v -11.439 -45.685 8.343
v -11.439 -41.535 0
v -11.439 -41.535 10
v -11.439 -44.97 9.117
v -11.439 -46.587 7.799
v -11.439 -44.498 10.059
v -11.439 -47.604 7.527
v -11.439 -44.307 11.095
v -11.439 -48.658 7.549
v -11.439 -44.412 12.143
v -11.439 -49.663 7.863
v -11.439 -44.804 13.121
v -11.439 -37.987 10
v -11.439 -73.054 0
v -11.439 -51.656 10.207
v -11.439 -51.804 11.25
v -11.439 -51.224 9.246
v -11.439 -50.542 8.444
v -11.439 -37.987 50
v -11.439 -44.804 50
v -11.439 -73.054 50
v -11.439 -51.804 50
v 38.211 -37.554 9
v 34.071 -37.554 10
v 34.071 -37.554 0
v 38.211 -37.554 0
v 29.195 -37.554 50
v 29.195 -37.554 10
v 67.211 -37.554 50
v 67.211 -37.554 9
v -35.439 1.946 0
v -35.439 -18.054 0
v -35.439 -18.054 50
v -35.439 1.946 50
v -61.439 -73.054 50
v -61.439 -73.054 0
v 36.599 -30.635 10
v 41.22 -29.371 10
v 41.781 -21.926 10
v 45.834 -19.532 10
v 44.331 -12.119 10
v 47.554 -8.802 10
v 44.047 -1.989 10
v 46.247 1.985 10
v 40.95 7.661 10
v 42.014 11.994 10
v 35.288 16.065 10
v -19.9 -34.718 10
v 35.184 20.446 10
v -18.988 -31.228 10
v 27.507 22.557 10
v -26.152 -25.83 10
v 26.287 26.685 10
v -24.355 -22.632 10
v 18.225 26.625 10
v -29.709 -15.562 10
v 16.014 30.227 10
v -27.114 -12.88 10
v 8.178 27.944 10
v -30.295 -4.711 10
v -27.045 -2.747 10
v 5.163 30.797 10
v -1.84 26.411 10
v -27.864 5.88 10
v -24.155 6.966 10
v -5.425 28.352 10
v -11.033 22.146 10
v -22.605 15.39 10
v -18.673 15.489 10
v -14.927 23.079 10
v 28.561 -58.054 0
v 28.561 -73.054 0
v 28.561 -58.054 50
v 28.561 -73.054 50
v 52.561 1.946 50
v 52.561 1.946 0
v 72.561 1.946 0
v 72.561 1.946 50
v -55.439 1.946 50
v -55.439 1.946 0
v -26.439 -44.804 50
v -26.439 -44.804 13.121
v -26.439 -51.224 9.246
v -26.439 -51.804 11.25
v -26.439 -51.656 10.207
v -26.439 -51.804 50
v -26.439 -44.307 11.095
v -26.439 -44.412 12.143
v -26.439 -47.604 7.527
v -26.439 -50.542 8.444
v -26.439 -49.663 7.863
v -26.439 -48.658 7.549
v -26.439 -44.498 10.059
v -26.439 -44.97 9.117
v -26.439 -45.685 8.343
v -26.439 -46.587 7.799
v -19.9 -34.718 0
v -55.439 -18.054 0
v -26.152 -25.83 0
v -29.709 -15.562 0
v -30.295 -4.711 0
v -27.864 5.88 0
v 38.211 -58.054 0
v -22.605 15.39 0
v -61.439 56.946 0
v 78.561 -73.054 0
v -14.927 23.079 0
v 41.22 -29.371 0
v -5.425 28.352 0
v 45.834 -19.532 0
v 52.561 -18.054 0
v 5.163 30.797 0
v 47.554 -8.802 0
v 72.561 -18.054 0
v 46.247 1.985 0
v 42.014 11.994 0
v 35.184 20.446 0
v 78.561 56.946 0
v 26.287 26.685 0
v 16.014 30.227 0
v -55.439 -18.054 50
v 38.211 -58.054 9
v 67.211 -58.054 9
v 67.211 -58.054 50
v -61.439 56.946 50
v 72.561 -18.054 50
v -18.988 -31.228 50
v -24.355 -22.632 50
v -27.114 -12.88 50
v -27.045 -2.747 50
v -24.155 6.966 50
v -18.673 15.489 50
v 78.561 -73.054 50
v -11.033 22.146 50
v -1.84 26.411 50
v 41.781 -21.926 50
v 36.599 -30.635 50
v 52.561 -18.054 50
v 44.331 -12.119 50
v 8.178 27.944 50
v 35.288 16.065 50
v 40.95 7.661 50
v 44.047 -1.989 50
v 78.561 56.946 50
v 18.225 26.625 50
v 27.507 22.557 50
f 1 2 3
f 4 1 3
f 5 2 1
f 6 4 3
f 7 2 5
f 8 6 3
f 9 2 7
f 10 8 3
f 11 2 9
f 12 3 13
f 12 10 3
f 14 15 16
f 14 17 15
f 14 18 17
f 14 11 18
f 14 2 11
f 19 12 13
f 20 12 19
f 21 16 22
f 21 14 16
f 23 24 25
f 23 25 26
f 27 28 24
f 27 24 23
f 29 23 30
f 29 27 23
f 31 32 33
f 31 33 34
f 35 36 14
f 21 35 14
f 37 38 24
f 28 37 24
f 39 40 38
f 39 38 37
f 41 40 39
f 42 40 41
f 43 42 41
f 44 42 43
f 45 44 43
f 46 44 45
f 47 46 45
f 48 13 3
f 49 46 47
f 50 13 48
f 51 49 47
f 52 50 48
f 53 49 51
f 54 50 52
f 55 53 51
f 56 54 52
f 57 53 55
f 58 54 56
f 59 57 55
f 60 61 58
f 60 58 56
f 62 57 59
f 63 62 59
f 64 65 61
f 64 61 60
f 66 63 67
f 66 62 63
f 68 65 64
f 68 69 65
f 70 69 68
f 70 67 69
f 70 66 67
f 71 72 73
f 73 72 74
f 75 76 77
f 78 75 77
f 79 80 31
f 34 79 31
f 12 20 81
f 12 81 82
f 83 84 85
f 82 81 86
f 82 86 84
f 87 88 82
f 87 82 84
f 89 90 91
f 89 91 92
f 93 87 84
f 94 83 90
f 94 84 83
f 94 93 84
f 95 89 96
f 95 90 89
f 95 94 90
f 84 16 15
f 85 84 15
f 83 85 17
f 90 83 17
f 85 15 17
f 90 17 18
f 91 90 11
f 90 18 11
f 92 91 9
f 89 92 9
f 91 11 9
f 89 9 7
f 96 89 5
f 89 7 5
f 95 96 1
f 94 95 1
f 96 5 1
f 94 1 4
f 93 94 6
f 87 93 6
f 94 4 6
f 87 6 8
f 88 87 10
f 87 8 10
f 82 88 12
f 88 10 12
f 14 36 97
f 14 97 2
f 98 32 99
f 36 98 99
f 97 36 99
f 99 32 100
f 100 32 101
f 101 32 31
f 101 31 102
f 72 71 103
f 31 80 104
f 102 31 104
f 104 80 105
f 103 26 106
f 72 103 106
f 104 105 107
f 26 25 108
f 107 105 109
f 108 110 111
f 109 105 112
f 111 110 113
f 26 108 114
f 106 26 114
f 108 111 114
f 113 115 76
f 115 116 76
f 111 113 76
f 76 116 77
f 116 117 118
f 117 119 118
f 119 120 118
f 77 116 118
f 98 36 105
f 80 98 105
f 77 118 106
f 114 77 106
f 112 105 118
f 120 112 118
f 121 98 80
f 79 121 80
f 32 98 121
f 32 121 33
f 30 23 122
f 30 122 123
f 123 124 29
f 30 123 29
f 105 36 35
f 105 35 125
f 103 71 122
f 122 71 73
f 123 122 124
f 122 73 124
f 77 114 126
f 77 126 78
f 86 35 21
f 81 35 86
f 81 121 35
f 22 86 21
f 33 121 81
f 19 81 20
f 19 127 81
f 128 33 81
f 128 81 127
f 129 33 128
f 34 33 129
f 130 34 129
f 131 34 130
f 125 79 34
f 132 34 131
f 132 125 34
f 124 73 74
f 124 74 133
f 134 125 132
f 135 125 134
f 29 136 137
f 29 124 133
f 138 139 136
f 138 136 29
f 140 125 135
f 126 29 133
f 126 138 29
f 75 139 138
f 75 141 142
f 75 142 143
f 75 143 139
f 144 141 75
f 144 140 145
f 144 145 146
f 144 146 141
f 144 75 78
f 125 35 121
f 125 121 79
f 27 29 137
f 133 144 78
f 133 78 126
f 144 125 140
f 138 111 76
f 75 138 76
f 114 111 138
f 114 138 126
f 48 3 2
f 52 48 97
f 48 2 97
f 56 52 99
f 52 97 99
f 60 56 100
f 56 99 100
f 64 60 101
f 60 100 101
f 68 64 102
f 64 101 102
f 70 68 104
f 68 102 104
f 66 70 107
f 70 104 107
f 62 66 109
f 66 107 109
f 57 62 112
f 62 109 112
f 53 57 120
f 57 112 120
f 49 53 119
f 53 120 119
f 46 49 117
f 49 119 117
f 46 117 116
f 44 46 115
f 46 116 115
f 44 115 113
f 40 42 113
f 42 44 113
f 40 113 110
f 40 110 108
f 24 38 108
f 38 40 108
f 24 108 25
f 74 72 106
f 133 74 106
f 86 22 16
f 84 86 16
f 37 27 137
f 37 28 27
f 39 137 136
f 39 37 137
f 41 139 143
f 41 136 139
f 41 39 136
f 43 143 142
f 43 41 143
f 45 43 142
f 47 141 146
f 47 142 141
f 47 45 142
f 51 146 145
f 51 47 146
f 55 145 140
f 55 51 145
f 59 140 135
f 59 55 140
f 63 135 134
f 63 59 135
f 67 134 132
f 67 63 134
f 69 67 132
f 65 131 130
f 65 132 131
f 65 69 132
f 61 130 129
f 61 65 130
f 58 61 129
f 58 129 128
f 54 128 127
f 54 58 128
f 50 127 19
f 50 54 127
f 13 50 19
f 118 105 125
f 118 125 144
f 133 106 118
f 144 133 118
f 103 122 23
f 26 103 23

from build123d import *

# Parameters (mm, degrees)
SKETCH_1_W          = 140
SKETCH_1_H          = 130
SKETCH_1_R          = 36
SKETCH_1_W_2        = 20
SKETCH_1_H_2        = 20
EXTRUDE_1_DEPTH     = 50
SKETCH_2_R          = 39
CUT_EXTRUDE_1_DEPTH = 10
CUT_EXTRUDE_2_REACH = 132
SKETCH_3_W          = 40
SKETCH_3_H          = 50
SKETCH_4_R          = 3.75
SKETCH_4_W          = 38.75
SKETCH_4_H          = 7
CUT_EXTRUDE_3_DEPTH = 15
SKETCH_6_W          = 9.65
SKETCH_6_H          = 20.5
CUT_EXTRUDE_4_DEPTH = 51
SKETCH_7_W          = 29
SKETCH_7_H          = 20.5
CUT_EXTRUDE_5_DEPTH = 41


with BuildPart() as part:
    # 草圖1 → 填料-伸長1 (new body)
    with BuildSketch(Plane.XY):
        with Locations((8.56146046, -8.054151625)):
            Rectangle(SKETCH_1_W, SKETCH_1_H)
        with Locations((8.56146046, -8.054151625)):
            Circle(SKETCH_1_R, mode=Mode.SUBTRACT)
        with Locations((-45.43853954, -8.054151625)):
            Rectangle(SKETCH_1_W_2, SKETCH_1_H_2, mode=Mode.SUBTRACT)
        with Locations((62.56146046, -8.054151625)):
            Rectangle(SKETCH_1_W_2, SKETCH_1_H_2, mode=Mode.SUBTRACT)
    extrude(amount=EXTRUDE_1_DEPTH)

    # 草圖2 → 除料-伸長1 (cut)
    with BuildSketch(Plane(origin=(0, 0, 0), x_dir=(-1, 0, 0), z_dir=(0, 0, -1))):
        with Locations((-8.56146046, -8.054151625)):
            Circle(SKETCH_2_R)
    extrude(amount=-CUT_EXTRUDE_1_DEPTH, mode=Mode.SUBTRACT)

    # 草圖3 → 除料-伸長2 (cut, up to next)
    with BuildSketch(Plane.XZ.offset(73.054151625), mode=Mode.PRIVATE) as cut_extrude_2_sk1:
        with Locations((8.56146046, 25)):
            Rectangle(SKETCH_3_W, SKETCH_3_H)
    cut_extrude_2_tool1 = extrude(cut_extrude_2_sk1.sketch, amount=-CUT_EXTRUDE_2_REACH, mode=Mode.PRIVATE) & part.part
    add(cut_extrude_2_tool1.solids().sort_by_distance((8.56146, -73.054152, 25))[0], mode=Mode.SUBTRACT)

    # 草圖4 → 除料-伸長3 (cut)
    with BuildSketch(Plane(origin=(-11.43853954, 0, 0), x_dir=(0, 0, -1), z_dir=(1, 0, 0))):
        with Locations((-11.25, -48.054151625)):
            Circle(SKETCH_4_R)
        with Locations((-30.625, -48.304151625)):
            Rectangle(SKETCH_4_W, SKETCH_4_H)
    extrude(amount=-CUT_EXTRUDE_3_DEPTH, mode=Mode.SUBTRACT)

    # 草圖6 → 除料-伸長4 (cut, through all)
    with BuildSketch(Plane.XY.offset(50)):
        with Locations((33.38646046, -47.804151625)):
            Rectangle(SKETCH_6_W, SKETCH_6_H)
    extrude(amount=-CUT_EXTRUDE_4_DEPTH, mode=Mode.SUBTRACT)

    # 草圖7 → 除料-伸長5 (cut)
    with BuildSketch(Plane.XY.offset(50)):
        with Locations((52.71146046, -47.804151625)):
            Rectangle(SKETCH_7_W, SKETCH_7_H)
    extrude(amount=-CUT_EXTRUDE_5_DEPTH, mode=Mode.SUBTRACT)


solid = part.part
